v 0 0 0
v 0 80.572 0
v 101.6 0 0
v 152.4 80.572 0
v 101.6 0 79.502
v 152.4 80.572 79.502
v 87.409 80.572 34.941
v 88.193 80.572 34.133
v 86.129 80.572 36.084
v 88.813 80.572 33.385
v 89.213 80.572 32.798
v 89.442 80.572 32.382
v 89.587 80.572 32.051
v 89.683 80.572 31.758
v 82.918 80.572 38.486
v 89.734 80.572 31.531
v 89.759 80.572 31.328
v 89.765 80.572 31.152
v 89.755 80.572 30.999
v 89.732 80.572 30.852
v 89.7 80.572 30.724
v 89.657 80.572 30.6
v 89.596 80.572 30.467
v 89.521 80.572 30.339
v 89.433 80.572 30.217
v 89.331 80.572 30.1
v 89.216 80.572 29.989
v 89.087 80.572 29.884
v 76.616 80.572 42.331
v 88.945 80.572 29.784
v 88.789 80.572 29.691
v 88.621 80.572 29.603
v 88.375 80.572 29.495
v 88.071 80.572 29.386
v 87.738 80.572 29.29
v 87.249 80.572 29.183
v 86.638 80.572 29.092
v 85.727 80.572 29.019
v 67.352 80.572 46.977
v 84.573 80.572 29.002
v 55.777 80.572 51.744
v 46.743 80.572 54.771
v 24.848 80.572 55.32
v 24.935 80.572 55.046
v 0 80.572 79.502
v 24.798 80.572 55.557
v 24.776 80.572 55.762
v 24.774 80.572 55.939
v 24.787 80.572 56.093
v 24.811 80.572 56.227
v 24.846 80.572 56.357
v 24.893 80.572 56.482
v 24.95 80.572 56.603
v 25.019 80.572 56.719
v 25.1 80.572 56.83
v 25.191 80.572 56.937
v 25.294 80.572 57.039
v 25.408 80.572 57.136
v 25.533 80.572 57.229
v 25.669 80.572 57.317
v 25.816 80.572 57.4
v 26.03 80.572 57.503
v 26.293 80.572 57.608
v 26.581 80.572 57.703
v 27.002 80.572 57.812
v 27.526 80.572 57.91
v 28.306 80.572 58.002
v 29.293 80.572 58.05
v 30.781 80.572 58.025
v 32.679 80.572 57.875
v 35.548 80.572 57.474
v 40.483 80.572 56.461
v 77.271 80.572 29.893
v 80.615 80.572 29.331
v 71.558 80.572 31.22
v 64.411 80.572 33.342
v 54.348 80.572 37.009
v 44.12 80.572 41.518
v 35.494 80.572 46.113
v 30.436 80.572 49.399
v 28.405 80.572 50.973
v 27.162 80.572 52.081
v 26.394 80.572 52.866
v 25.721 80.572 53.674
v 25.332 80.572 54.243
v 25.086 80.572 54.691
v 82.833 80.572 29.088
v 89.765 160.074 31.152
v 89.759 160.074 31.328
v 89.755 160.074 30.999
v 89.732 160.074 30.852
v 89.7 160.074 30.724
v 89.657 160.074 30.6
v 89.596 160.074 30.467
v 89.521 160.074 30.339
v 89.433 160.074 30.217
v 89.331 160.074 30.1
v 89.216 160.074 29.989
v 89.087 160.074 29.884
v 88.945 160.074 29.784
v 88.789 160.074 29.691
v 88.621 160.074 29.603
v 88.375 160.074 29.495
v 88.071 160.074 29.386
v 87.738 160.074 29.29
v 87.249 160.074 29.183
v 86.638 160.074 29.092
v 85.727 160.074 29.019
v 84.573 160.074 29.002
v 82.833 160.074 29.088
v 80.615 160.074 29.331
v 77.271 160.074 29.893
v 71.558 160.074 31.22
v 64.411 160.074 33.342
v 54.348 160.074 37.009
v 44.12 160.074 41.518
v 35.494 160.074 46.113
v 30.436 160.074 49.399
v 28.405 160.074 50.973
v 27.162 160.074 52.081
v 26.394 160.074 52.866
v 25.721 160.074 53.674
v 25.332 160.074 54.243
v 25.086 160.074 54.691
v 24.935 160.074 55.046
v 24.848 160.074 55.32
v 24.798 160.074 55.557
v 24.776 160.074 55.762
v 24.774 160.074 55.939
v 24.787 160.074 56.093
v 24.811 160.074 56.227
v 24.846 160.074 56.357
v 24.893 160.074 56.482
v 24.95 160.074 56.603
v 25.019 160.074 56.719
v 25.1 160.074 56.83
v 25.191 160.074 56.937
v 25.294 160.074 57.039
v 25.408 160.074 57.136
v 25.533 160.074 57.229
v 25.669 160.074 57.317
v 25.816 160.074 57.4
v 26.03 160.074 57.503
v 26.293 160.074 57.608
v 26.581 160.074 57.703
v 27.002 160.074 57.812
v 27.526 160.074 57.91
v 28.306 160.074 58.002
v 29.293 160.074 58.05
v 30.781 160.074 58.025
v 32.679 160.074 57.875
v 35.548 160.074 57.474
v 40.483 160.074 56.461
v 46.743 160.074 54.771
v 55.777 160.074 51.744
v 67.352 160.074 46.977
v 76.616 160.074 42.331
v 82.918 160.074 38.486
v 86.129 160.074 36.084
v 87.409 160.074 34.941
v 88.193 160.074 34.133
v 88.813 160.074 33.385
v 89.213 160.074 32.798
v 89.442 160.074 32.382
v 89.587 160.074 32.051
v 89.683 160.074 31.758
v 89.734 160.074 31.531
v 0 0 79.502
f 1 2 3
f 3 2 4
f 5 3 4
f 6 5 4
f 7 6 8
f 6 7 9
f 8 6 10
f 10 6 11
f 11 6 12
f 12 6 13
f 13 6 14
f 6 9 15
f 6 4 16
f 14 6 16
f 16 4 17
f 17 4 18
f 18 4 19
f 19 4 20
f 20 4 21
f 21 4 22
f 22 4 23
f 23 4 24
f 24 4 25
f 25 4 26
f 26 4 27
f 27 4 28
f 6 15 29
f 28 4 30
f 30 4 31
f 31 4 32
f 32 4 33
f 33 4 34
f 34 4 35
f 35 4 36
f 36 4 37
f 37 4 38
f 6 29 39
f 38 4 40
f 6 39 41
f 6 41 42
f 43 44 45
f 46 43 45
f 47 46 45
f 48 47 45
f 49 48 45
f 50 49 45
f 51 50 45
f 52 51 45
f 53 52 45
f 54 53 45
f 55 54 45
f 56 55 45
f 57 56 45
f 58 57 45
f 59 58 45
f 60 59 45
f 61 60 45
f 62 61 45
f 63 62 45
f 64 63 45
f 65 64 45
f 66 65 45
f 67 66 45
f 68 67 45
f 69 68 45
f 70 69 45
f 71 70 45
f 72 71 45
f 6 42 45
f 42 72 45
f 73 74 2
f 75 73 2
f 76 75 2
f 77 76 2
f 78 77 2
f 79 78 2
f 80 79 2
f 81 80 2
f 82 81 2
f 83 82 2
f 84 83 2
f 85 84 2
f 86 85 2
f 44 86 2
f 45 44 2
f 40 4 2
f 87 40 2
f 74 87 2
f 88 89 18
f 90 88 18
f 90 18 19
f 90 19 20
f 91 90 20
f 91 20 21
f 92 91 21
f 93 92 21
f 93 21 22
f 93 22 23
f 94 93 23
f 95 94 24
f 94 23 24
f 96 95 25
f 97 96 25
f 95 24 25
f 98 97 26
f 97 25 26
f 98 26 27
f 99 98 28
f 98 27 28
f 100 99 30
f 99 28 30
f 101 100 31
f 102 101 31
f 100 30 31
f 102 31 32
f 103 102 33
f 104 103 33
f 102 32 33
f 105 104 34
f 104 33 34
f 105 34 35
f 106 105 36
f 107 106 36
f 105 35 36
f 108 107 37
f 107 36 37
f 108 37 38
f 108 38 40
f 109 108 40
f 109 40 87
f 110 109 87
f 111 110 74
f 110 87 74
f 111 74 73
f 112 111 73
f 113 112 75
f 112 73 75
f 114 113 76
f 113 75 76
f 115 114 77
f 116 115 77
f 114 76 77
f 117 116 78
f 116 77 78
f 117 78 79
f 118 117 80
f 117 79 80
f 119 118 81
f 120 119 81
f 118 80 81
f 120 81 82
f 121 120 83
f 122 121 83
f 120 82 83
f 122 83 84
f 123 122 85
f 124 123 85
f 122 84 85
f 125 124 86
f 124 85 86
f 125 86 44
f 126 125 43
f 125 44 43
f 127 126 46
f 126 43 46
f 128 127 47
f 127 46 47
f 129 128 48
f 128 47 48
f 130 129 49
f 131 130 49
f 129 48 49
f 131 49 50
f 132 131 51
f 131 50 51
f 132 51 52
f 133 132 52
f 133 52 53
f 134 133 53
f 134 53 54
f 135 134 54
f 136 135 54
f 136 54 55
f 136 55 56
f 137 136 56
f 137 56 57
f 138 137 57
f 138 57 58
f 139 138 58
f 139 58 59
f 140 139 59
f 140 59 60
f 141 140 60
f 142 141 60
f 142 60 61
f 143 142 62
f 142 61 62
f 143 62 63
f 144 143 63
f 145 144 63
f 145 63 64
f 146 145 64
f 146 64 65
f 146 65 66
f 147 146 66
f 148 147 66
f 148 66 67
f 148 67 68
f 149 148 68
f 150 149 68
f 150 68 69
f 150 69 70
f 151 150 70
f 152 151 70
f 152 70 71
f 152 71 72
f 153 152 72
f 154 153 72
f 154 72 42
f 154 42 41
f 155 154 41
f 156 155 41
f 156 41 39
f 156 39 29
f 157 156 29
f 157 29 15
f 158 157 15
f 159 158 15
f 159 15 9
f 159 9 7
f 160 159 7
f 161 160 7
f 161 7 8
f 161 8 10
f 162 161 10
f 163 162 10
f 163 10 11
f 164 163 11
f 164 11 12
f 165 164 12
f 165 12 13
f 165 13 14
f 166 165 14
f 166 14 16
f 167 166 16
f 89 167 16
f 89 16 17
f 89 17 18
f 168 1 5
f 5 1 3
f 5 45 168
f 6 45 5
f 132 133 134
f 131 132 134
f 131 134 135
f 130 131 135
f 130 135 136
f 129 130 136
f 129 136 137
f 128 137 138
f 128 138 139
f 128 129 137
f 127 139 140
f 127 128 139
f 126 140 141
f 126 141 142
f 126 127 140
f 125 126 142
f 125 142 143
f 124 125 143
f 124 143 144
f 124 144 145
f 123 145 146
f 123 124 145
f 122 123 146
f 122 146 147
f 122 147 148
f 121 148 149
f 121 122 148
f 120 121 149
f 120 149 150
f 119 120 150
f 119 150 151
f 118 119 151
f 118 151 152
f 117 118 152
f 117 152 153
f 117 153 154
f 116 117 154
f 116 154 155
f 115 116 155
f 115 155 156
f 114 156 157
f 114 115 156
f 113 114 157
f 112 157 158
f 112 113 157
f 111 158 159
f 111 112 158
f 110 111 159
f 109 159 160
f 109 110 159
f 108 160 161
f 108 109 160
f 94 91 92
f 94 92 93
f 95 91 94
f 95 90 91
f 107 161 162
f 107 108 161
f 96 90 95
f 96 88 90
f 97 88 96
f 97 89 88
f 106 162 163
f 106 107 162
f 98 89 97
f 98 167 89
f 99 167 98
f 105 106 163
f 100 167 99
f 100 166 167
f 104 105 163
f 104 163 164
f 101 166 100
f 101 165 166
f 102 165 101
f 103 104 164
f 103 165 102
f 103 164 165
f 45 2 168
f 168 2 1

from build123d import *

# Parameters (mm, degrees)
BOSS_EXTRUDE1_DEPTH = 79.502
SKETCH2_RX          = 34.87252212
SKETCH2_RY          = 7.136819482
BOSS_EXTRUDE2_DEPTH = 79.502


with BuildPart() as part:
    # Sketch1 → Boss-Extrude1 (new body)
    with BuildSketch(Plane.XY):
        Polygon((0, 0), (101.6, 0), (152.4, 80.572467382), (0, 80.572467382), align=None)
    extrude(amount=BOSS_EXTRUDE1_DEPTH)

    # Sketch2 → Boss-Extrude2 (add)
    with BuildSketch(Plane(origin=(0, 80.572467382, 0), x_dir=(1, 0, 0), z_dir=(0, 1, 0))):
        with Locations(Location((57.268893284, -43.52674359), (0, 0, 21.757695584))):
            Ellipse(SKETCH2_RX, SKETCH2_RY)
    extrude(amount=BOSS_EXTRUDE2_DEPTH)


solid = part.part
